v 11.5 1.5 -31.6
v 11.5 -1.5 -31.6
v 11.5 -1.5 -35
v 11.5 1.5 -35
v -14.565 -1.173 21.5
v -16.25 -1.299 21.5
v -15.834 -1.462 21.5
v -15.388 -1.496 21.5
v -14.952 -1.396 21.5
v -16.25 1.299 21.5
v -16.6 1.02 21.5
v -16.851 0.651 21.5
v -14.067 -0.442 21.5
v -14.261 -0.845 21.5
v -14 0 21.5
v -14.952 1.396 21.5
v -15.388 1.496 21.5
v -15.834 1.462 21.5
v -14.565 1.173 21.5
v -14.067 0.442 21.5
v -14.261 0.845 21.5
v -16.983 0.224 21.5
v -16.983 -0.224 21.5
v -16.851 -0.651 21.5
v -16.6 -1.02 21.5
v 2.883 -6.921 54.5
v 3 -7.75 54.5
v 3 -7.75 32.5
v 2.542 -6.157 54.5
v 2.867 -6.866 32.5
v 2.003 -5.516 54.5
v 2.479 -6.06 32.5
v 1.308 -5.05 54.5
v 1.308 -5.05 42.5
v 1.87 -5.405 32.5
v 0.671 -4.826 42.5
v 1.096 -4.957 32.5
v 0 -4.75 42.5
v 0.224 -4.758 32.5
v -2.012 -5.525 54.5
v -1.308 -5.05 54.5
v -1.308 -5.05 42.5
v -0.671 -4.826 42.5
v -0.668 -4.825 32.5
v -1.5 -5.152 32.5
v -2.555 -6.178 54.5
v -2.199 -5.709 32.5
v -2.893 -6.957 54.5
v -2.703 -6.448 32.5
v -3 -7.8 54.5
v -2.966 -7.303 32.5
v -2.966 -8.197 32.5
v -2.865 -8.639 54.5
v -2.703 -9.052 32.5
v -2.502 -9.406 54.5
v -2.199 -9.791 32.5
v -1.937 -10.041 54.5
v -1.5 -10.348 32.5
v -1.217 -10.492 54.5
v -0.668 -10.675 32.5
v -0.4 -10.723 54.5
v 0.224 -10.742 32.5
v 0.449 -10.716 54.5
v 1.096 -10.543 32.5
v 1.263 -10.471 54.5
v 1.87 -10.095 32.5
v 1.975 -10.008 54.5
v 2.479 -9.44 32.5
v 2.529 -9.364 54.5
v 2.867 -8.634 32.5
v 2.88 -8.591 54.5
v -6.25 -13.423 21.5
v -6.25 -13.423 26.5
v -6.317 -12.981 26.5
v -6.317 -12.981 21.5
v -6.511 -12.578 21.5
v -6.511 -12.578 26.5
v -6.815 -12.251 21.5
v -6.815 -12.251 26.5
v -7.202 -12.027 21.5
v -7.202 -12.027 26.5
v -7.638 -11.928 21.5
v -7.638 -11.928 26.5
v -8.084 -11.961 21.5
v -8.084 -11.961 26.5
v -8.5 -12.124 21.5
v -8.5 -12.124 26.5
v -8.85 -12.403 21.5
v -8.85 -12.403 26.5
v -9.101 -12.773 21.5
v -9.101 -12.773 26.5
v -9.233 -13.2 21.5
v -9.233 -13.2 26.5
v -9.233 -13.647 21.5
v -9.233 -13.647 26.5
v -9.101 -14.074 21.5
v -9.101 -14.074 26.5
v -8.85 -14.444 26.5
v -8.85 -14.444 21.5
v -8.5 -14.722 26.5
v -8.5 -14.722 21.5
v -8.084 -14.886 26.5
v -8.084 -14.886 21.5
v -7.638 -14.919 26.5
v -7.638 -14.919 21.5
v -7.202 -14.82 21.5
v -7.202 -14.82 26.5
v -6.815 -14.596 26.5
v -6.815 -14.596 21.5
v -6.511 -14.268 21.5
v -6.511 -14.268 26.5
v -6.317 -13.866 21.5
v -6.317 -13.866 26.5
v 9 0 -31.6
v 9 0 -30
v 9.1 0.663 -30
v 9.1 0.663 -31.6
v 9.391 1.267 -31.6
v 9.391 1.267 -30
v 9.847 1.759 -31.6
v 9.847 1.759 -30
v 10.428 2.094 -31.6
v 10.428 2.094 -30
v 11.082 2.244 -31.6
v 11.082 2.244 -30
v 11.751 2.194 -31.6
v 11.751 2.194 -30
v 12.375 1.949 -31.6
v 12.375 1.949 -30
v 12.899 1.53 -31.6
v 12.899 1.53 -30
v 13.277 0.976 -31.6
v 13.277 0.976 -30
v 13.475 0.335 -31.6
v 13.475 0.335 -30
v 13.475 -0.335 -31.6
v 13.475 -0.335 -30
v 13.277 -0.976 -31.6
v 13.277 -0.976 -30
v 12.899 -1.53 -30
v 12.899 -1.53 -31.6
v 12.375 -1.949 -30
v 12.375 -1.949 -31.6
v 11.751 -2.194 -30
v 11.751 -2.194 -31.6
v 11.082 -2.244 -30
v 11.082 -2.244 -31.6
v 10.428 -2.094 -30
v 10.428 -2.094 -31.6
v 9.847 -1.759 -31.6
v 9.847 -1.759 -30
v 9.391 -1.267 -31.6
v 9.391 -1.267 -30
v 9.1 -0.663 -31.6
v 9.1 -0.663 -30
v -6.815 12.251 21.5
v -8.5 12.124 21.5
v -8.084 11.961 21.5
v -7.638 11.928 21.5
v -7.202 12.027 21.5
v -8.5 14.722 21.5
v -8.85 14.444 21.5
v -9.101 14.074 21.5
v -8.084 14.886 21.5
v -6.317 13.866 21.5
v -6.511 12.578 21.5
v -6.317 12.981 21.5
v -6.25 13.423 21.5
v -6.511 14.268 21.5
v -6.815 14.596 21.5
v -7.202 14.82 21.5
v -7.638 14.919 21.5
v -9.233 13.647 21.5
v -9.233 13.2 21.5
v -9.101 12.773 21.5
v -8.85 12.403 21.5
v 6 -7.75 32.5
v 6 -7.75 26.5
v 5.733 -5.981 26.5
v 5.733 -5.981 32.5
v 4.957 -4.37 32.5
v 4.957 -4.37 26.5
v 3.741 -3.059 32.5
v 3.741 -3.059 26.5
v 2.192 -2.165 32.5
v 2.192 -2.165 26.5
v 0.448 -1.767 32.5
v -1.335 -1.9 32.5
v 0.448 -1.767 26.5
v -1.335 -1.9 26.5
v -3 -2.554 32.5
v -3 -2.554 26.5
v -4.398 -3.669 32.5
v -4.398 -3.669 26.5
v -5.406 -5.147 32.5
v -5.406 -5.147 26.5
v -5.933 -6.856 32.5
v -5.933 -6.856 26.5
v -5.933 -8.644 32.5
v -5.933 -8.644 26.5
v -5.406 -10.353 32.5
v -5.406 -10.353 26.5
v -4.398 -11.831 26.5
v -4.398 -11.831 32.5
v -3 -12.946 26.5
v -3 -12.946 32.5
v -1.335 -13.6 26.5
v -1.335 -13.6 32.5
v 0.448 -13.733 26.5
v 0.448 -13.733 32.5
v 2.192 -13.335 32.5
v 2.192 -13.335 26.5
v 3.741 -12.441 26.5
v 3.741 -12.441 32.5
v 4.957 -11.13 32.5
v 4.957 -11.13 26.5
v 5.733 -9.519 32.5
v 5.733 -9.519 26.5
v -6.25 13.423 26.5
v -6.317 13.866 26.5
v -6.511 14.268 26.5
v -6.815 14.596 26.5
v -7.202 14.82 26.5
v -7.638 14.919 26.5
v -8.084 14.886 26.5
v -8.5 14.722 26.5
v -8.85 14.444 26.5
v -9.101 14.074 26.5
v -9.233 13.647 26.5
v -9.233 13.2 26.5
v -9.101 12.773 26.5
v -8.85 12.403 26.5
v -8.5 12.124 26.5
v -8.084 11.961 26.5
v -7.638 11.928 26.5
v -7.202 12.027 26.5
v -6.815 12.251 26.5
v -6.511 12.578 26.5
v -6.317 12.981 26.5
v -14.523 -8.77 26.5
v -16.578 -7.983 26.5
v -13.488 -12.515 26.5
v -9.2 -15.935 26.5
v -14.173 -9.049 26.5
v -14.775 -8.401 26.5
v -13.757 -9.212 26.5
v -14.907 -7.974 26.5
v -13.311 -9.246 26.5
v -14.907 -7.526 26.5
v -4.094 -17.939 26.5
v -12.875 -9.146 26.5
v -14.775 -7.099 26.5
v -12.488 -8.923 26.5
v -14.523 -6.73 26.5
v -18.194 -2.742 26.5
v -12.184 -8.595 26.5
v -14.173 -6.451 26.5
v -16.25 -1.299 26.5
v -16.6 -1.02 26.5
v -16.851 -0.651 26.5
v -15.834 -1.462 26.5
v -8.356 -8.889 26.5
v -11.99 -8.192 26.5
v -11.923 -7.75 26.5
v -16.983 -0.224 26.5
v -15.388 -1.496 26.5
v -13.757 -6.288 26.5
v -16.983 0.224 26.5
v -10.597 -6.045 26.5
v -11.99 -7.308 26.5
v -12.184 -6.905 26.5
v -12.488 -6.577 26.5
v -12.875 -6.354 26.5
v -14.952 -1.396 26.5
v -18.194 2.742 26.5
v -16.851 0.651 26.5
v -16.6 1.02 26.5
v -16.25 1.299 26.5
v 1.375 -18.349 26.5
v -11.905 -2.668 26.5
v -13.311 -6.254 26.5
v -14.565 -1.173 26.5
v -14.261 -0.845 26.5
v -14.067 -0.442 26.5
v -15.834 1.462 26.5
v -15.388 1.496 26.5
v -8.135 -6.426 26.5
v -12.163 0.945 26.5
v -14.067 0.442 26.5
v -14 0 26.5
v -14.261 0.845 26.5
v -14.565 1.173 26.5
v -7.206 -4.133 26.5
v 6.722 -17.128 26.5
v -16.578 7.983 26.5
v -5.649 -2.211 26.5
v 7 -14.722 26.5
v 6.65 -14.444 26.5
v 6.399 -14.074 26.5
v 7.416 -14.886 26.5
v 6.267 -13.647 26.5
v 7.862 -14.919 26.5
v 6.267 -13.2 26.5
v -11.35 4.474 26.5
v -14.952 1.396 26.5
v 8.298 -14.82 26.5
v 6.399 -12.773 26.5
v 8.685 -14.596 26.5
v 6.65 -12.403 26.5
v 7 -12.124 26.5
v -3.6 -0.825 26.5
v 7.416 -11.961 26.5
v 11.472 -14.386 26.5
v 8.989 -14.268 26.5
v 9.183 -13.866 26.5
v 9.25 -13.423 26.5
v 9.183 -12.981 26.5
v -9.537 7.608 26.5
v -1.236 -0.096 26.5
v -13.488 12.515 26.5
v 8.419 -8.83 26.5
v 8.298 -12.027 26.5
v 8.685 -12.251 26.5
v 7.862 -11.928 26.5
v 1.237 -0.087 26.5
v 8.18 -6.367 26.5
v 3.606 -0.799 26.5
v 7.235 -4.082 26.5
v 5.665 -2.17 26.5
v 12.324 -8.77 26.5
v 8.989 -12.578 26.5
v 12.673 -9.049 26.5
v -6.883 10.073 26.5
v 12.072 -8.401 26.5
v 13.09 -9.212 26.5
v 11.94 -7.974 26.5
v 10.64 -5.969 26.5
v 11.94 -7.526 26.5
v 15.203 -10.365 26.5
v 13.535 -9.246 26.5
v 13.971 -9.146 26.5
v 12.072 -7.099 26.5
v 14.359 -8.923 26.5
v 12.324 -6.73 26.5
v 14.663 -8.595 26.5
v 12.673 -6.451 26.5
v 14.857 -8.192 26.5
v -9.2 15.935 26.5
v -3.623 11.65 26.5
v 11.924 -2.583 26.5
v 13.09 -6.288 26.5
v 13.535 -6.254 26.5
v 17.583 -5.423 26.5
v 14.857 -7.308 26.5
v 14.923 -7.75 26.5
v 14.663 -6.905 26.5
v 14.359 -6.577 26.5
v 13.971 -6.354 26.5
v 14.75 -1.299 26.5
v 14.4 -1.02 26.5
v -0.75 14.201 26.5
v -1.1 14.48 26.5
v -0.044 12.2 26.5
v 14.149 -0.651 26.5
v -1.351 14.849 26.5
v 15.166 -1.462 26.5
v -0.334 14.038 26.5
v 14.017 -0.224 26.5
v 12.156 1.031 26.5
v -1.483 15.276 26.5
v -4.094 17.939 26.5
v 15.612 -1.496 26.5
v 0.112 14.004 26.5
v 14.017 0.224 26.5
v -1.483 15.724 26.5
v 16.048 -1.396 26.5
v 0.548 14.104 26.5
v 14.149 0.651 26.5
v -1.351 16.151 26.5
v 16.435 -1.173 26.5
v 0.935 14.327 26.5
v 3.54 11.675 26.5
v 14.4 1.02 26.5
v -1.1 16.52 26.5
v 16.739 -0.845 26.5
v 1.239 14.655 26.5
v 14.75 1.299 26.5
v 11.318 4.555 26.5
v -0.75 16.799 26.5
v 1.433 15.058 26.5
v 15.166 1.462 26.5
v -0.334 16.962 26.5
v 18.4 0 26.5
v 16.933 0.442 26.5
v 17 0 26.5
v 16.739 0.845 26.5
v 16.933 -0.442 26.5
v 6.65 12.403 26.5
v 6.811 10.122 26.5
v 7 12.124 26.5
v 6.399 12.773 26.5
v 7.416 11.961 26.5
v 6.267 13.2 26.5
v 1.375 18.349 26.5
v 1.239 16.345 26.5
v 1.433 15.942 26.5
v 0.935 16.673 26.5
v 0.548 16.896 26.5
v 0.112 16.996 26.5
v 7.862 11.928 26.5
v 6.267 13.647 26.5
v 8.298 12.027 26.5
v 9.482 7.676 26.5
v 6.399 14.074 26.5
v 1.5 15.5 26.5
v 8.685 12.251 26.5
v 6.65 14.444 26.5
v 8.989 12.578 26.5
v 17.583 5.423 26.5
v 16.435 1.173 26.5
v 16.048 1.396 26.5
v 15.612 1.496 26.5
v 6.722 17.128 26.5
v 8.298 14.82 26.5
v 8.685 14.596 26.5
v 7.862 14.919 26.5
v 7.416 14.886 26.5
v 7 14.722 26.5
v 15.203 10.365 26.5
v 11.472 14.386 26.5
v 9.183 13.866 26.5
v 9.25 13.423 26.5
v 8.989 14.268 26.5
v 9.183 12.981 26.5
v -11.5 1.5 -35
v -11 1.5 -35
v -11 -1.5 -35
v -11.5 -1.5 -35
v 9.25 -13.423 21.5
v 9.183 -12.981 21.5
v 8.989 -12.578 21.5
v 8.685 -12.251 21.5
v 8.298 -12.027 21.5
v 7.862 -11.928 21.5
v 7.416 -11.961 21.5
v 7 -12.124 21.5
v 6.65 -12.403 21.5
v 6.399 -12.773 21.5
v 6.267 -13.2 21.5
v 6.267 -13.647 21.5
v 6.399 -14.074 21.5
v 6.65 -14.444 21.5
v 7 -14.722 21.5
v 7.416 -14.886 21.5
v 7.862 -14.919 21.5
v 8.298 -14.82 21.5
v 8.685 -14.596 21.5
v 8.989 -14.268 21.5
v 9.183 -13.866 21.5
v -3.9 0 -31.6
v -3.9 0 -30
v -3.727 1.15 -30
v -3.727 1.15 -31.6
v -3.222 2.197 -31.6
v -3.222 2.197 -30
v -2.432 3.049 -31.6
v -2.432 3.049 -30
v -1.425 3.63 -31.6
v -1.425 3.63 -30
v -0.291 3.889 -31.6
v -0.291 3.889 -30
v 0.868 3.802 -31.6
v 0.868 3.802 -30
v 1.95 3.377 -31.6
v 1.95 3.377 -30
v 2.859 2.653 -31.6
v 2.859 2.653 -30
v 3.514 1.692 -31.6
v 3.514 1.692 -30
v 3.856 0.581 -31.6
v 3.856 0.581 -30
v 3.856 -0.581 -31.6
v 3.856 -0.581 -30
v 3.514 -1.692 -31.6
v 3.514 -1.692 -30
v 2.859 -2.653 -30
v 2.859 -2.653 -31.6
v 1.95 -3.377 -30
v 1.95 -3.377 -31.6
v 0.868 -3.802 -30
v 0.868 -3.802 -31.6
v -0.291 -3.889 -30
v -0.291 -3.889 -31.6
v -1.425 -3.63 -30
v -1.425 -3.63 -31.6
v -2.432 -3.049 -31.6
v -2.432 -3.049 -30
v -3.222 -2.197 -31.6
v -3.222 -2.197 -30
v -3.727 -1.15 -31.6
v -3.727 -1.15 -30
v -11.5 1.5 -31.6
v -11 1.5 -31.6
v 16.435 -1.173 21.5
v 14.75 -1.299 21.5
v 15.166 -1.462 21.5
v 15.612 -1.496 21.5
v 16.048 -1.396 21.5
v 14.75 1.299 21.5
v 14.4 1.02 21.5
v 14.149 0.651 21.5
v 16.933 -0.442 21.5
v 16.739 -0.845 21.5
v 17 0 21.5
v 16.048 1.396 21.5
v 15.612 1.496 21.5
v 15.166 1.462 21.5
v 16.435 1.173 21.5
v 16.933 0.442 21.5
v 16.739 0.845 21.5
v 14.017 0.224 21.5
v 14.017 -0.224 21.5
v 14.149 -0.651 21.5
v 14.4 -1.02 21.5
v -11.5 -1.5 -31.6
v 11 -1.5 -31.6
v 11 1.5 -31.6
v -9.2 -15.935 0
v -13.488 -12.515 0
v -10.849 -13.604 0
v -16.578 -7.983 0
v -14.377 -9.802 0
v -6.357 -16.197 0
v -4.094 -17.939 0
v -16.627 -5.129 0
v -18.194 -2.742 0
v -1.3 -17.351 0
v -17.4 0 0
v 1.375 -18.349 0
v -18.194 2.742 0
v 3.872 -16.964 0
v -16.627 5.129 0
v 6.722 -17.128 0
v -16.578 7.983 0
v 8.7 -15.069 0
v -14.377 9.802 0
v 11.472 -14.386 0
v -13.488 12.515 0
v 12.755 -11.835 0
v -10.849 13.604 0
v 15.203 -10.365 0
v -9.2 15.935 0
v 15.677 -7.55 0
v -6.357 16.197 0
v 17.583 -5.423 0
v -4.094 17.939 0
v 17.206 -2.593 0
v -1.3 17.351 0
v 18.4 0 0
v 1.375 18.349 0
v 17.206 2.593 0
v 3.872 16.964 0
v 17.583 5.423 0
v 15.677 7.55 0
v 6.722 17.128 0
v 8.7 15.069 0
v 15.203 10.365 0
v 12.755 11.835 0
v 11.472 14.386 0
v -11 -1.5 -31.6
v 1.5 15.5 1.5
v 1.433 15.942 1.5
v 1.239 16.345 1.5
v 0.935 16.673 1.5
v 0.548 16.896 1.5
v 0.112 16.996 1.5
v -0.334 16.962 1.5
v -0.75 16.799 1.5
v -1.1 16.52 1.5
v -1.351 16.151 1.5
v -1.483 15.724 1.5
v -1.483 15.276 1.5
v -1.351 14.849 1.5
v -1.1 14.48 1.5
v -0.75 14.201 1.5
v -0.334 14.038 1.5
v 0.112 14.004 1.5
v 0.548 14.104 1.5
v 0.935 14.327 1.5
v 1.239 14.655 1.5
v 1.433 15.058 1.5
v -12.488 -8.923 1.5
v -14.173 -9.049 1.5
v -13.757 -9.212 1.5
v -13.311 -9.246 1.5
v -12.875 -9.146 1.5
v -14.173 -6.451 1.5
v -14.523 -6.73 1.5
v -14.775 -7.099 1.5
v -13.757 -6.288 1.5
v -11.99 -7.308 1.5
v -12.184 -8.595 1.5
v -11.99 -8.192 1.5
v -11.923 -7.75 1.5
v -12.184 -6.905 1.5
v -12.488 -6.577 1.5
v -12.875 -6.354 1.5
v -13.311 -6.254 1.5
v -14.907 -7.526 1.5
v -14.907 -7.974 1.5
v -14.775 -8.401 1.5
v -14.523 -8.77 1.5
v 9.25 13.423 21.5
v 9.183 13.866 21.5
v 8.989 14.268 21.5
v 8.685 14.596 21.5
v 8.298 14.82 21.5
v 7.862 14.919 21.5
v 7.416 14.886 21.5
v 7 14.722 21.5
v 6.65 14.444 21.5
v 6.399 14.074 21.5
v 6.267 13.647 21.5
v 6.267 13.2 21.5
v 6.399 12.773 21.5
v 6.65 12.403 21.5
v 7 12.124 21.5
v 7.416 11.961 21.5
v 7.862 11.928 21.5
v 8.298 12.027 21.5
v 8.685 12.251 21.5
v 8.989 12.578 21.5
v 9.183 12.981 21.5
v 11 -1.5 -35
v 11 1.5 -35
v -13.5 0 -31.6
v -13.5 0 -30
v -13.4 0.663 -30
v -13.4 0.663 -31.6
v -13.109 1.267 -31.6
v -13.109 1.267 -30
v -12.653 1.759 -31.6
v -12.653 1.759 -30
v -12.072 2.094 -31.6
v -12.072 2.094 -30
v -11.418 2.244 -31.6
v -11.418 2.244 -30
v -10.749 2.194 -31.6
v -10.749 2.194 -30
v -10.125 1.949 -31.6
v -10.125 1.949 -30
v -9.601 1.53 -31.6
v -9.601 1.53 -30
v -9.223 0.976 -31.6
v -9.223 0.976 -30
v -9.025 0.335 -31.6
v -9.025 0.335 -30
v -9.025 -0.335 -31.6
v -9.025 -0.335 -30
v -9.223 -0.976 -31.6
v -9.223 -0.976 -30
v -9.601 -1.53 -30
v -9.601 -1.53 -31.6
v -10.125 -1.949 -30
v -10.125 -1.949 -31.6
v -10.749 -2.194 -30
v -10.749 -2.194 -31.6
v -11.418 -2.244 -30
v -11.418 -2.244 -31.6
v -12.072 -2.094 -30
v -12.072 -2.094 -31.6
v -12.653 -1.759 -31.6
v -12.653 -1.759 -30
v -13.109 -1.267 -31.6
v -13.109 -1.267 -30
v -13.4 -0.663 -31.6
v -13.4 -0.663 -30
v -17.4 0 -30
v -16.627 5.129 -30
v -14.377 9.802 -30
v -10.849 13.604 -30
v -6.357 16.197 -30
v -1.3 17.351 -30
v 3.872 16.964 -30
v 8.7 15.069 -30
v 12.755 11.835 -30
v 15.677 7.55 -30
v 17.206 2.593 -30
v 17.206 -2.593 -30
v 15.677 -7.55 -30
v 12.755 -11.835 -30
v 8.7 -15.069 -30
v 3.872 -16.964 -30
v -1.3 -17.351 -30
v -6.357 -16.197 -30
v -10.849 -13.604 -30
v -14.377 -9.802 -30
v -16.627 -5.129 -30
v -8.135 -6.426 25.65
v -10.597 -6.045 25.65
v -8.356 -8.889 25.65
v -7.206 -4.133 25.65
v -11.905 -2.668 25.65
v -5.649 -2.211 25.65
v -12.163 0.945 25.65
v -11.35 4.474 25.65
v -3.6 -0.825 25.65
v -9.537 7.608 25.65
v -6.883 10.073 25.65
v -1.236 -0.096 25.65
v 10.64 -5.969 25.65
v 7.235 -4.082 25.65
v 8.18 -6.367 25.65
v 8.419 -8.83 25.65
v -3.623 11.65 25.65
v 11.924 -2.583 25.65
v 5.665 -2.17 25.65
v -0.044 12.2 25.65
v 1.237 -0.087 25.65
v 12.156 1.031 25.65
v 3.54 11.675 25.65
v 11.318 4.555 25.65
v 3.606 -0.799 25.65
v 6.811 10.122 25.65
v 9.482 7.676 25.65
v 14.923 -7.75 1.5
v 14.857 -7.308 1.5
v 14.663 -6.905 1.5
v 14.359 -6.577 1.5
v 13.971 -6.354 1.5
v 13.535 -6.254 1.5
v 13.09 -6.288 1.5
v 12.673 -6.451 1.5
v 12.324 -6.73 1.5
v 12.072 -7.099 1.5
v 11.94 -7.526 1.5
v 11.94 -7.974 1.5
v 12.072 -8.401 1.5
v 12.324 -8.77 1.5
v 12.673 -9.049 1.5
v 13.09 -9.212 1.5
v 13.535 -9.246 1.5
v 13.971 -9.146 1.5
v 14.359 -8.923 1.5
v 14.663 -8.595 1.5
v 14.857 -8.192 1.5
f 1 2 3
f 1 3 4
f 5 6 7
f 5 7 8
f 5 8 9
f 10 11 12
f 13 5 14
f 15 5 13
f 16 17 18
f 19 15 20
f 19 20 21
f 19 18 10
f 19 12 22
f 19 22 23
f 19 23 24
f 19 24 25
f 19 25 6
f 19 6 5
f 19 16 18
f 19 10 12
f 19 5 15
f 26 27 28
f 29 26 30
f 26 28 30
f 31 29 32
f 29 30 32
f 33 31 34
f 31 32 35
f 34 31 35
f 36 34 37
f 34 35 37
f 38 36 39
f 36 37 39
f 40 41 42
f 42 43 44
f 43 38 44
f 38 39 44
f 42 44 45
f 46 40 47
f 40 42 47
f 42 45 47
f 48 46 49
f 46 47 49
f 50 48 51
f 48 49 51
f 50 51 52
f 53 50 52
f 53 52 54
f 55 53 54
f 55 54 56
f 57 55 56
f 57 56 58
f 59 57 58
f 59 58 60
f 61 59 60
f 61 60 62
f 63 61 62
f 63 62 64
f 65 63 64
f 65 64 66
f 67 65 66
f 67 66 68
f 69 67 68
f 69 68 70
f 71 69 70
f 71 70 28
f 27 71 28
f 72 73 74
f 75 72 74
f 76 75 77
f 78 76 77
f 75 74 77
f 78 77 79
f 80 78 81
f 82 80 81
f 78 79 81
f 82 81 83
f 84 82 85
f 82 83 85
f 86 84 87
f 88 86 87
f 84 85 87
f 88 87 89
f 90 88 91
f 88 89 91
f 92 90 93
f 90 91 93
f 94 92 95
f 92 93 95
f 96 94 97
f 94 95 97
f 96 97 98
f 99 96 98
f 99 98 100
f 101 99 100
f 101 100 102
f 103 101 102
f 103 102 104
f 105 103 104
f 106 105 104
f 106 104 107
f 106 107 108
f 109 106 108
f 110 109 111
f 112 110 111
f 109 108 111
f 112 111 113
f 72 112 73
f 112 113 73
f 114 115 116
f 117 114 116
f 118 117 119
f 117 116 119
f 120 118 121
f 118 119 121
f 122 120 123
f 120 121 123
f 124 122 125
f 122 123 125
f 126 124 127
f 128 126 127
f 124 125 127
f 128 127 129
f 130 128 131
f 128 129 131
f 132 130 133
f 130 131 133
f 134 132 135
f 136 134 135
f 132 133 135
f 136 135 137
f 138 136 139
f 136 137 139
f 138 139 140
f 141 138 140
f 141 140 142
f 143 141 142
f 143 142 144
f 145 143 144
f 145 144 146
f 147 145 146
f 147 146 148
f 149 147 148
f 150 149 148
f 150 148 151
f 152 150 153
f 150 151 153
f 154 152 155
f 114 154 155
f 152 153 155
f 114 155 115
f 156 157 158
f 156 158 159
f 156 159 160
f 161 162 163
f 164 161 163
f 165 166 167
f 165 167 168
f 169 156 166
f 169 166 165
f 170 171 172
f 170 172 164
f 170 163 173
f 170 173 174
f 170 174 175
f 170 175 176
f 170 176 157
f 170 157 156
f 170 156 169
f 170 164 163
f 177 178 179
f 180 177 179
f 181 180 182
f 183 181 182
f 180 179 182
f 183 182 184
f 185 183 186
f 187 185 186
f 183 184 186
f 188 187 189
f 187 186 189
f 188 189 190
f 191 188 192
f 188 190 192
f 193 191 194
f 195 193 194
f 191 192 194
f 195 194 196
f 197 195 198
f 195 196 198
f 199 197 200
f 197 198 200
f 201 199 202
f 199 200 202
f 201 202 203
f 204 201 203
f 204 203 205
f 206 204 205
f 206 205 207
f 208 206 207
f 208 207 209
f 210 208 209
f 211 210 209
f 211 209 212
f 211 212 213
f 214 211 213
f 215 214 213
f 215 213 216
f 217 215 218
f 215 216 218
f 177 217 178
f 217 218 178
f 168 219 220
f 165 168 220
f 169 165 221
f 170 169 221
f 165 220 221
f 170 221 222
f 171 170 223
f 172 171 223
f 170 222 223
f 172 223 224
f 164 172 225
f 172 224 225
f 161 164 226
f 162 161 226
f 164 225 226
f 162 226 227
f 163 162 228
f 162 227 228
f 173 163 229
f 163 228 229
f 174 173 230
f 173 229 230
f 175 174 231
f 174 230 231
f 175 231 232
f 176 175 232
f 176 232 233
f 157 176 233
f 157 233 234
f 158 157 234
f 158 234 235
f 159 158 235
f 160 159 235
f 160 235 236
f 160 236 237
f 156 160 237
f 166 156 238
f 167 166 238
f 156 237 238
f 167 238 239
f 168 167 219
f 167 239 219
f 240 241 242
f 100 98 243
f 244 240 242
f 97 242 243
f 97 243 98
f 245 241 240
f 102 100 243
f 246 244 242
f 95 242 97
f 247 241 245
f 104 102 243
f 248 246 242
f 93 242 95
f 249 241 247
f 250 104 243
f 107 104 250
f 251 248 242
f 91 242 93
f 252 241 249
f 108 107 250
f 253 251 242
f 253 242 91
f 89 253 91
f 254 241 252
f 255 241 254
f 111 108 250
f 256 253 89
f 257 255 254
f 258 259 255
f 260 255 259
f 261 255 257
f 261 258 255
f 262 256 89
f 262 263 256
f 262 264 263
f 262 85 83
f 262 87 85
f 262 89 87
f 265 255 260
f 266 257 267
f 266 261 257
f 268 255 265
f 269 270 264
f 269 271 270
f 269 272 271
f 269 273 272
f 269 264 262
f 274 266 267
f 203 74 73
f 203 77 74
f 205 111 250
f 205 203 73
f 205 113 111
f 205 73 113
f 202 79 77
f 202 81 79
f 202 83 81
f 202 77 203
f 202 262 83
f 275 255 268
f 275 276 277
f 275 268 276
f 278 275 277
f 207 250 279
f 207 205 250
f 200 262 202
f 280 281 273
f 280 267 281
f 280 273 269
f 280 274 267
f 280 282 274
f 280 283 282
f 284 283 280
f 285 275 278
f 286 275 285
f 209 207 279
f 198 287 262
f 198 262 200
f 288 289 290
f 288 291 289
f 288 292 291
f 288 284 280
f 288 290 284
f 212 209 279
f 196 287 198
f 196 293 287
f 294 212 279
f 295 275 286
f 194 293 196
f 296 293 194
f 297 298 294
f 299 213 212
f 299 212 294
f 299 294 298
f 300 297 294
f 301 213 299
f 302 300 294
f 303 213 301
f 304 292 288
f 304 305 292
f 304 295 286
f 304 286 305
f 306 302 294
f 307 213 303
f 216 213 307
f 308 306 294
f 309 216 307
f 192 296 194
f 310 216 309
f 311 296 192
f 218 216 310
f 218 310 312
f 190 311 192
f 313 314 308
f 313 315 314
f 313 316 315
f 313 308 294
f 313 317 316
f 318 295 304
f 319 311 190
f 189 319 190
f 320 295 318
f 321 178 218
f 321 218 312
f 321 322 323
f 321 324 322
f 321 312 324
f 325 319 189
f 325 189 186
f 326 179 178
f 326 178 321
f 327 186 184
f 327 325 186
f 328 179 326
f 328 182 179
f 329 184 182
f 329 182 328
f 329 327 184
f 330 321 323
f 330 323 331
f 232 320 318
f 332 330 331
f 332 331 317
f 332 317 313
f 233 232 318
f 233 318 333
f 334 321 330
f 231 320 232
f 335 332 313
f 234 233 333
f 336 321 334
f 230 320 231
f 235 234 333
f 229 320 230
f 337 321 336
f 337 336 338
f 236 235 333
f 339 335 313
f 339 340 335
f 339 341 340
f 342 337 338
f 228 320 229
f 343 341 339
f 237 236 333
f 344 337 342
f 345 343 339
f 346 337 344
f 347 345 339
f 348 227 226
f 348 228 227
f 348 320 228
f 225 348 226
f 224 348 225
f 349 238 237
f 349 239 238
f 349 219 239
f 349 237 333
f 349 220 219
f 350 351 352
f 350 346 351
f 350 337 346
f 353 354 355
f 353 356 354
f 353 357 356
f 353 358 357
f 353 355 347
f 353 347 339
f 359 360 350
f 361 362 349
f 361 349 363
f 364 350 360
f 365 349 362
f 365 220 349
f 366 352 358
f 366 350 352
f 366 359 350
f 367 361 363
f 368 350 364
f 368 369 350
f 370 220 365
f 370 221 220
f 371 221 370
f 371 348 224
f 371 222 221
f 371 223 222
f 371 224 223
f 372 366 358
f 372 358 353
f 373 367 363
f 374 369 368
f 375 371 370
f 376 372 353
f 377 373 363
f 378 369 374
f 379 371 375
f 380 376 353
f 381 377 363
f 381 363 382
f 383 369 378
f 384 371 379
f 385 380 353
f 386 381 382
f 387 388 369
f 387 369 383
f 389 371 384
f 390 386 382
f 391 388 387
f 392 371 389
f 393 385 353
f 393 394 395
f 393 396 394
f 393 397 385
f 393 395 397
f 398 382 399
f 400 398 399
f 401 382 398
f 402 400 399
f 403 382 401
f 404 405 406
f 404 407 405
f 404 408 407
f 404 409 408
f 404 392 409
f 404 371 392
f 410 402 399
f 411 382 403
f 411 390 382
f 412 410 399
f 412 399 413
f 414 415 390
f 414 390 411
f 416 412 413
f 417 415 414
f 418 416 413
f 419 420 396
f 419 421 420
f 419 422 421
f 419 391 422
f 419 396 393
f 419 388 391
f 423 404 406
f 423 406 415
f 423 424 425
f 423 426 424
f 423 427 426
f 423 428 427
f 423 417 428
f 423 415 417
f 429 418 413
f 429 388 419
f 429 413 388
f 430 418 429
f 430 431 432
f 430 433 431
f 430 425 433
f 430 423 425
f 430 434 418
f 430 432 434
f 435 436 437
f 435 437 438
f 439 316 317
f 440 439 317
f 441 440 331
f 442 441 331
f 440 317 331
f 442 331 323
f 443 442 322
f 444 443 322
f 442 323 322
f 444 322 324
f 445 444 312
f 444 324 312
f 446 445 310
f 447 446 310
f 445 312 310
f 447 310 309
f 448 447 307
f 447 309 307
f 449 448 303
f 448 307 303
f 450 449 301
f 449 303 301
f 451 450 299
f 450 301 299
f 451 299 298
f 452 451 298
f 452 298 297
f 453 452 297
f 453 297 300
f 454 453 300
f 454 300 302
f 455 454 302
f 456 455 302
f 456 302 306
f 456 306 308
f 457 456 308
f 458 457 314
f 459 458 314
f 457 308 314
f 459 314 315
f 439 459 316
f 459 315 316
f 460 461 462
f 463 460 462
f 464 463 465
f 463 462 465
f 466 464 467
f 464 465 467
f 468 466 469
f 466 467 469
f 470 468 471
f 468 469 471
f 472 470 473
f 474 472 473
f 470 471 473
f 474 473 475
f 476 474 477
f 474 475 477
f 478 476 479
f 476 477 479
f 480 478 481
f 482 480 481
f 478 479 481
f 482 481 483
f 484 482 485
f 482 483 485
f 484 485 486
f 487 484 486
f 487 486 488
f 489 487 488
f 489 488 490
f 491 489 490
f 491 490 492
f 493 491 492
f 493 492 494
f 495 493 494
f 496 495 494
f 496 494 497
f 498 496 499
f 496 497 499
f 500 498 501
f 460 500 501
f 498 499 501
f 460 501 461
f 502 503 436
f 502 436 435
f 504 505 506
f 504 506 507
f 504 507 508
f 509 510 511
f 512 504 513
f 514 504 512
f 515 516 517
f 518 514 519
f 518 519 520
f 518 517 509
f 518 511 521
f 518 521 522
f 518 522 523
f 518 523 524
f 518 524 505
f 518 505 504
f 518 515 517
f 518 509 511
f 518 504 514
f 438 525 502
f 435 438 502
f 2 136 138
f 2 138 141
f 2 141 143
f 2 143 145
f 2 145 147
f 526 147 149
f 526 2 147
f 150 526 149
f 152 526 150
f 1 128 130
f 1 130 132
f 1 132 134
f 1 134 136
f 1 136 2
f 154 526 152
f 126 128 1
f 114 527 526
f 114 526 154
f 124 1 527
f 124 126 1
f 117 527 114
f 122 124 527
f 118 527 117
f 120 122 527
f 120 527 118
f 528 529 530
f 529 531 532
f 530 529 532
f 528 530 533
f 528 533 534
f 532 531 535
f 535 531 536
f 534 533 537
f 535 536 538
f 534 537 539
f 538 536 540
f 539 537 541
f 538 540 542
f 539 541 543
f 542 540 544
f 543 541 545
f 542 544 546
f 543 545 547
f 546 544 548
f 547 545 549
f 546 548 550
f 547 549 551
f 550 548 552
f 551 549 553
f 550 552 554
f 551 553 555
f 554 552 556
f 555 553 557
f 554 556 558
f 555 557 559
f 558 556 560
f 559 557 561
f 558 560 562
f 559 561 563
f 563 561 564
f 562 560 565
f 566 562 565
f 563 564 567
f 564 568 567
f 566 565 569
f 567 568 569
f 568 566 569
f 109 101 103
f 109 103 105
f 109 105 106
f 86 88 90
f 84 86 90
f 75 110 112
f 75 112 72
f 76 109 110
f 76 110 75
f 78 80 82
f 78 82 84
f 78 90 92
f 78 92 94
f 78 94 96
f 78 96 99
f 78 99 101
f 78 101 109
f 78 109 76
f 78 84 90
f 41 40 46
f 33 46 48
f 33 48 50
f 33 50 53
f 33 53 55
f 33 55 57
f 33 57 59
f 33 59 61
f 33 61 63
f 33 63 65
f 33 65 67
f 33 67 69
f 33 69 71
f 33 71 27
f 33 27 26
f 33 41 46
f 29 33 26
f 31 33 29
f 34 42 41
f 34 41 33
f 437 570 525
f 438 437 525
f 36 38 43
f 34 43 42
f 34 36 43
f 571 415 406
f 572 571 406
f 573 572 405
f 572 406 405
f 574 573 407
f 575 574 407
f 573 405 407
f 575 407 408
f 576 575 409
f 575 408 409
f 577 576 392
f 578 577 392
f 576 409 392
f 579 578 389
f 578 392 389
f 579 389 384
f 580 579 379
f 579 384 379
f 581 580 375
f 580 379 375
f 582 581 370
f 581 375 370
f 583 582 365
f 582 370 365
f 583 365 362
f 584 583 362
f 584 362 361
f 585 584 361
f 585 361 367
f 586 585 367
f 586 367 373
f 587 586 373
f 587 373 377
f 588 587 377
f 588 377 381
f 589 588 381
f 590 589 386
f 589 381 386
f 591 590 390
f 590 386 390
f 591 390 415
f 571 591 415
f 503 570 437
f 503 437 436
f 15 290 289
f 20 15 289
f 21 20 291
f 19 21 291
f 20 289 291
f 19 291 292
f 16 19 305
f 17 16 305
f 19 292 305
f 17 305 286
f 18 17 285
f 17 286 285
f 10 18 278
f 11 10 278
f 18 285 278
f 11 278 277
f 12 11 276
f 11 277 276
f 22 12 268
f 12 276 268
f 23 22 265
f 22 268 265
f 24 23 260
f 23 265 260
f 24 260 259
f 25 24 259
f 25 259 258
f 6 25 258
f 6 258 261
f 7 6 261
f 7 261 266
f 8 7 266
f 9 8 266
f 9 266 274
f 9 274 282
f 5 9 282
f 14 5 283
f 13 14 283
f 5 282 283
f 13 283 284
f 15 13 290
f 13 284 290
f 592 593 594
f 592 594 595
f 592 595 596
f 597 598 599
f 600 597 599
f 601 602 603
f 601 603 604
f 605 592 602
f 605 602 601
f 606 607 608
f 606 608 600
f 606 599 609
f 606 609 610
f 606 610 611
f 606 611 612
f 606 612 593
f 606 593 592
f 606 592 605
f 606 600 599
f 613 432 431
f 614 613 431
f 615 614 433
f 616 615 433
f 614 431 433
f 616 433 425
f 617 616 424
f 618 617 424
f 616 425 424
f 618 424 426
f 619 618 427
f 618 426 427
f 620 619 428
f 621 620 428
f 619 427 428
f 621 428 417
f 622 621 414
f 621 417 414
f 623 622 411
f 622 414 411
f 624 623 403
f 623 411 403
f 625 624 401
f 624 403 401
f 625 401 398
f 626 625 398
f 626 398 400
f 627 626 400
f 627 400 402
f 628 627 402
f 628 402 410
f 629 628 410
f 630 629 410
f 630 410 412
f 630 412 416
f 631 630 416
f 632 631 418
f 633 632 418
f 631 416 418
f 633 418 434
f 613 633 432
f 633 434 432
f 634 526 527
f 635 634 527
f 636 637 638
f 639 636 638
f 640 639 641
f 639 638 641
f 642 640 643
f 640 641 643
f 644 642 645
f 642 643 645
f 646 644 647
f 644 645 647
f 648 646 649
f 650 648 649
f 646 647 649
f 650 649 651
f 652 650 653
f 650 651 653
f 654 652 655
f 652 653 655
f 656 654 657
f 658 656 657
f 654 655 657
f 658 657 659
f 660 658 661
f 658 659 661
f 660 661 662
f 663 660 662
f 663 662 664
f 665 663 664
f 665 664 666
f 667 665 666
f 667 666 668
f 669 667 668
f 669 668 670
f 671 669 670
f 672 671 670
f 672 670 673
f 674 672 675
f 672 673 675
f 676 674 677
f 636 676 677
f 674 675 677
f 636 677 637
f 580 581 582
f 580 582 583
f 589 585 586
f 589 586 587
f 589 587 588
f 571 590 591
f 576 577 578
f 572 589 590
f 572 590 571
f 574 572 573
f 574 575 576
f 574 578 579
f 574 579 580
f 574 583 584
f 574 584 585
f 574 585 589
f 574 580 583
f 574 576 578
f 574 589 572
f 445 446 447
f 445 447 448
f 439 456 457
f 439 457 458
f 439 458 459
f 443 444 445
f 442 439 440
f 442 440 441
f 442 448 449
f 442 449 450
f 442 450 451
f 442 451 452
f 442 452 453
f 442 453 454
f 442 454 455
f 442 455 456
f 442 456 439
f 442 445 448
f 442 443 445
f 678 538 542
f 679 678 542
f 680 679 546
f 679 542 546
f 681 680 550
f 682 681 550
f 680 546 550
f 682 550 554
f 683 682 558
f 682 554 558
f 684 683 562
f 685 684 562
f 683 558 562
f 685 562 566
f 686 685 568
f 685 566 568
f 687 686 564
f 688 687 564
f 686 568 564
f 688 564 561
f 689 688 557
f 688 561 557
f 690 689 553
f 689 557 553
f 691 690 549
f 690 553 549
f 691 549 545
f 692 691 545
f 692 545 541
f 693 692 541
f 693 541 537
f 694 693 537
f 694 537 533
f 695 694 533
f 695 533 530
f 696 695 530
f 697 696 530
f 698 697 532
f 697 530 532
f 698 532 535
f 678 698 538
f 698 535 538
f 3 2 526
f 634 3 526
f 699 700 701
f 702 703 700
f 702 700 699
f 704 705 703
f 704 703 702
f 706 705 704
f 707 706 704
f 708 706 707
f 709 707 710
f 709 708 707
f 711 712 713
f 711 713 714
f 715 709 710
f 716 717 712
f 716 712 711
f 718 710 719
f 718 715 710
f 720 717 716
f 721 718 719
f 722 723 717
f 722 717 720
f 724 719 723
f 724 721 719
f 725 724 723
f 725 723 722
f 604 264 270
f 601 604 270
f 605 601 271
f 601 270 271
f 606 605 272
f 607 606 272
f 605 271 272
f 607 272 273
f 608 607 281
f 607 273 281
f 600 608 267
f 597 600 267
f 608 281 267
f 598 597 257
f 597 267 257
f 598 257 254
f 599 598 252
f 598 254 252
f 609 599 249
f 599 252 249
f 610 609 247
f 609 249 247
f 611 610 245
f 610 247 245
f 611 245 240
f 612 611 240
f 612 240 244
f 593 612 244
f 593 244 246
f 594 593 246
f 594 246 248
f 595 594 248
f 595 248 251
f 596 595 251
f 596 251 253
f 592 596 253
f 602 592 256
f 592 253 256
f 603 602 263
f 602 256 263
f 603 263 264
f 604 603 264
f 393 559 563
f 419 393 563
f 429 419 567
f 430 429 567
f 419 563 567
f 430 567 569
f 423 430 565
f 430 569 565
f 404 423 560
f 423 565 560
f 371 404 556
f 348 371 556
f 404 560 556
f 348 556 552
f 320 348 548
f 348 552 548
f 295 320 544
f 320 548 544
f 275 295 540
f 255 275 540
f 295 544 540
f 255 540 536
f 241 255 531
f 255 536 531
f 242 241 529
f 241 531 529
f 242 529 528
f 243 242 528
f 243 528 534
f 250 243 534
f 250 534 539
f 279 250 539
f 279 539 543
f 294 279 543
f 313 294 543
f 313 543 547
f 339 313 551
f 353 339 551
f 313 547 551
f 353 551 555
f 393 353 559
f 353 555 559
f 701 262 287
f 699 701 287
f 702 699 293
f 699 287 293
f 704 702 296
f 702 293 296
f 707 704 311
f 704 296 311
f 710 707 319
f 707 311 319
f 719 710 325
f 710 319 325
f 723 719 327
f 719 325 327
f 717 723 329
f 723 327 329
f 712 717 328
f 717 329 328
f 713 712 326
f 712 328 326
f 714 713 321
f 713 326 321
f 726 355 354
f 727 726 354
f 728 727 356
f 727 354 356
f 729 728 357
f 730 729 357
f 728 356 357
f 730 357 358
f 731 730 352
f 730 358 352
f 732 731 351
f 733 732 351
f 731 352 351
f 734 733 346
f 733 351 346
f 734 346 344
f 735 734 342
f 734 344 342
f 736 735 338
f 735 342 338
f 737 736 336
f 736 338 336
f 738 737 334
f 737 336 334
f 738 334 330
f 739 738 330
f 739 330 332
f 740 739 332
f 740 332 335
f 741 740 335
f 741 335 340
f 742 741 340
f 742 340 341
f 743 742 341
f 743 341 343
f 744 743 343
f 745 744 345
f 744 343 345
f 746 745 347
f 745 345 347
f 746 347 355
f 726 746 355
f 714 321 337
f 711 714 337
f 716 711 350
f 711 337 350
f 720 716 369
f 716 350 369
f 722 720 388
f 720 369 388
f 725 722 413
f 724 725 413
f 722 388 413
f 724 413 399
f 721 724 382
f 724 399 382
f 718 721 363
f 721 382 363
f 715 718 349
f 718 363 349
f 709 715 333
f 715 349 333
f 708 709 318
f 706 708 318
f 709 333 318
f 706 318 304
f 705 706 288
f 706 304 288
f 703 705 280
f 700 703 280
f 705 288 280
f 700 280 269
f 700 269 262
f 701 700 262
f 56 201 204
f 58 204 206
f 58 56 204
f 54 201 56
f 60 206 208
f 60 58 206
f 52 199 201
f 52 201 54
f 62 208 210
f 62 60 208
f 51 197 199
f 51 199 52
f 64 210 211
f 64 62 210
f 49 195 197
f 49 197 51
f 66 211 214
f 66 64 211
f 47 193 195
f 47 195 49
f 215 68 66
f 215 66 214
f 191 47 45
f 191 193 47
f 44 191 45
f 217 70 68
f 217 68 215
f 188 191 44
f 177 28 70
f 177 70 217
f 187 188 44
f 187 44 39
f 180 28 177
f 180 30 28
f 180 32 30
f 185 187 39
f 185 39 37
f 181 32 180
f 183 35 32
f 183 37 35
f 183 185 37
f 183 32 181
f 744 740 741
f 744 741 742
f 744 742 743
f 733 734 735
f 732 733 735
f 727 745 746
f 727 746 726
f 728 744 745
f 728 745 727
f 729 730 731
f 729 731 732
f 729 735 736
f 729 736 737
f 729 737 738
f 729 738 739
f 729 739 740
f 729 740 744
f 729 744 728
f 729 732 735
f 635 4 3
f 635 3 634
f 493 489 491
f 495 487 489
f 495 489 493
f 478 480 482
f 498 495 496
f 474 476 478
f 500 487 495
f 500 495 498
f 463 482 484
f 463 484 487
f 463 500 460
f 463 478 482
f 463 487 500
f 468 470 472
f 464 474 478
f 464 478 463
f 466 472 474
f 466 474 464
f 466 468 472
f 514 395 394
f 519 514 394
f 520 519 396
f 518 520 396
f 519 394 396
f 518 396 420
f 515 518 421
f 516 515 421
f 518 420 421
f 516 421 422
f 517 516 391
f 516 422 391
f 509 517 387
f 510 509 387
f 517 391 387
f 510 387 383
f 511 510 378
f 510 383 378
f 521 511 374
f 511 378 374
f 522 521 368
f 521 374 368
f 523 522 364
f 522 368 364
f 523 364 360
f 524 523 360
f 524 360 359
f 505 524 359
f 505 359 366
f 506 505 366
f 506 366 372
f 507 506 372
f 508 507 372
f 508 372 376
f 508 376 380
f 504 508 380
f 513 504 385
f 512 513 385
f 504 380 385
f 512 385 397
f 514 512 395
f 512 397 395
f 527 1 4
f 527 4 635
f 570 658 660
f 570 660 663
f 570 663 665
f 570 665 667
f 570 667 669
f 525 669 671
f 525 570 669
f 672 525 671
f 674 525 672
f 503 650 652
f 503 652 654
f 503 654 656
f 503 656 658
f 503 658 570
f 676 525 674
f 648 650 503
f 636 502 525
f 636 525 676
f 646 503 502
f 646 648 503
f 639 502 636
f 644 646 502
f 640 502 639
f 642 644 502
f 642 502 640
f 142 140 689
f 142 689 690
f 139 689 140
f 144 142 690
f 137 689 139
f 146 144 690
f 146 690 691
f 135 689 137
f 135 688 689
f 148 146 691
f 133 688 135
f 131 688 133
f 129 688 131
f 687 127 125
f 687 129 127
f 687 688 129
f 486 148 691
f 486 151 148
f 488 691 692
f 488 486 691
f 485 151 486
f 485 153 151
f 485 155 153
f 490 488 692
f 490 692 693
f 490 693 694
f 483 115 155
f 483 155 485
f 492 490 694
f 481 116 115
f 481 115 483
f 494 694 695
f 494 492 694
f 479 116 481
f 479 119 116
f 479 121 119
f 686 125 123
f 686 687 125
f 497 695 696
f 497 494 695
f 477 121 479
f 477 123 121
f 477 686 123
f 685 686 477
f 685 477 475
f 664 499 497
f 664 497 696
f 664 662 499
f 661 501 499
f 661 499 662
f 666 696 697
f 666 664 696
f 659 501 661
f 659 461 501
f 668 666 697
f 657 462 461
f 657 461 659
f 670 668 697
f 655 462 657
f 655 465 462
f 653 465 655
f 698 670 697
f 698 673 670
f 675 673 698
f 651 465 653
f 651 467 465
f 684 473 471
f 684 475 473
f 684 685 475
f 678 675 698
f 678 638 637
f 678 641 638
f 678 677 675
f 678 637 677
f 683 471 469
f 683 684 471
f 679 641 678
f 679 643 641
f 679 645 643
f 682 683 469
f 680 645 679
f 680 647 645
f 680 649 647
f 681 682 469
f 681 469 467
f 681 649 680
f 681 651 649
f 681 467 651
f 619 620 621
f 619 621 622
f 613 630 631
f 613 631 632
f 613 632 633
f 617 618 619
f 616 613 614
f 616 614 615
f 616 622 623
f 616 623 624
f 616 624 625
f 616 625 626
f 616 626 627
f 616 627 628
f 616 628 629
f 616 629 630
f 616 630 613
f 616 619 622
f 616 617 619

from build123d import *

# Parameters (mm, degrees)
CROQUIS1_R              = 18.4
SALIENTE_EXTRUIR1_DEPTH = 26.5
CORTAR_EXTRUIR2_DEPTH   = 0.85
CROQUIS3_R              = 1.5
CORTAR_EXTRUIR3_DEPTH   = 25
CROQUIS9_R              = 1.5
CORTAR_EXTRUIR4_DEPTH   = 5
CROQUIS22_R             = 6
SALIENTE_EXTRUIR2_DEPTH = 6
CROQUIS24_R             = 3
SALIENTE_EXTRUIR3_DEPTH = 22
CORTAR_EXTRUIR5_DEPTH   = 12
CROQUIS26_R             = 17.4
SALIENTE_EXTRUIR4_DEPTH = 30
CROQUIS27_R             = 3.9
CROQUIS27_R_2           = 2.25
CROQUIS27_W             = 0.5
CROQUIS27_H             = 3
SALIENTE_EXTRUIR5_DEPTH = 1.6
CROQUIS29_W             = 0.5
CROQUIS29_H             = 3
SALIENTE_EXTRUIR6_DEPTH = 5


with BuildPart() as part:
    # Croquis1 → Saliente-Extruir1 (new body)
    with BuildSketch(Plane.XY):
        Circle(CROQUIS1_R)
    extrude(amount=SALIENTE_EXTRUIR1_DEPTH)

    # Croquis2 → Cortar-Extruir2 (cut)
    with BuildSketch(Plane.XY.offset(26.5)):
        with BuildLine():
            ThreePointArc((8.4190219, -8.8295), (-0.043589152, 12.19992213), (-8.355713846, -8.889434523))
            ThreePointArc((-8.355713846, -8.889434523), (0, 0), (8.4190219, -8.8295))
        make_face()
    extrude(amount=-CORTAR_EXTRUIR2_DEPTH, mode=Mode.SUBTRACT)

    # Croquis3 → Cortar-Extruir3 (cut)
    with BuildSketch(Plane.XY.offset(26.5)):
        with Locations((0, 15.5)):
            Circle(CROQUIS3_R)
        with Locations((13.423393759, -7.75)):
            Circle(CROQUIS3_R)
        with Locations((-13.423393759, -7.75)):
            Circle(CROQUIS3_R)
    extrude(amount=-CORTAR_EXTRUIR3_DEPTH, mode=Mode.SUBTRACT)

    # Croquis9 → Cortar-Extruir4 (cut)
    with BuildSketch(Plane.XY.offset(26.5)):
        with Locations((-15.5, 0)):
            Circle(CROQUIS9_R)
        with Locations((-7.75, 13.423393759)):
            Circle(CROQUIS9_R)
        with Locations((7.75, 13.423393759)):
            Circle(CROQUIS9_R)
        with Locations((15.5, 0)):
            Circle(CROQUIS9_R)
        with Locations((7.75, -13.423393759)):
            Circle(CROQUIS9_R)
        with Locations((-7.75, -13.423393759)):
            Circle(CROQUIS9_R)
    extrude(amount=-CORTAR_EXTRUIR4_DEPTH, mode=Mode.SUBTRACT)

    # Croquis22 → Saliente-Extruir2 (add)
    with BuildSketch(Plane.XY.offset(26.5)):
        with Locations((0, -7.75)):
            Circle(CROQUIS22_R)
    extrude(amount=SALIENTE_EXTRUIR2_DEPTH)

    # Croquis24 → Saliente-Extruir3 (add)
    with BuildSketch(Plane.XY.offset(32.5)):
        with Locations((0, -7.75)):
            Circle(CROQUIS24_R)
    extrude(amount=SALIENTE_EXTRUIR3_DEPTH)

    # Croquis25 → Cortar-Extruir5 (cut)
    with BuildSketch(Plane.XY.offset(54.5)):
        Polygon((-72.570863995, -5.05), (-1.307669683, -5.05), (1.307669683, -5.05), (72.570863995, -5.05), (72.570863995, 137.476388625), (-72.570863995, 137.476388625), align=None)
    extrude(amount=-CORTAR_EXTRUIR5_DEPTH, mode=Mode.SUBTRACT)

    # Croquis26 → Saliente-Extruir4 (add)
    with BuildSketch(Plane(origin=(0, 0, 0), x_dir=(-1, 0, 0), z_dir=(0, 0, -1))):
        Circle(CROQUIS26_R)
    extrude(amount=SALIENTE_EXTRUIR4_DEPTH)

    # Croquis27 → Saliente-Extruir5 (add)
    with BuildSketch(Plane(origin=(0, 0, -30), x_dir=(-1, 0, 0), z_dir=(0, 0, -1))):
        Circle(CROQUIS27_R)
        with Locations((-11.25, 0)):
            Circle(CROQUIS27_R_2)
        with Locations((-11.25, 0)):
            Rectangle(CROQUIS27_W, CROQUIS27_H, mode=Mode.SUBTRACT)
        with Locations((11.25, 0)):
            Circle(CROQUIS27_R_2)
        with Locations((11.25, 0)):
            Rectangle(CROQUIS27_W, CROQUIS27_H, mode=Mode.SUBTRACT)
    extrude(amount=SALIENTE_EXTRUIR5_DEPTH)

    # Croquis29 → Saliente-Extruir6 (add)
    with BuildSketch(Plane(origin=(0, 0, -30), x_dir=(-1, 0, 0), z_dir=(0, 0, -1))):
        with Locations((-11.25, 0)):
            Rectangle(CROQUIS29_W, CROQUIS29_H)
        with Locations((11.25, 0)):
            Rectangle(CROQUIS29_W, CROQUIS29_H)
    extrude(amount=SALIENTE_EXTRUIR6_DEPTH)


solid = part.part
